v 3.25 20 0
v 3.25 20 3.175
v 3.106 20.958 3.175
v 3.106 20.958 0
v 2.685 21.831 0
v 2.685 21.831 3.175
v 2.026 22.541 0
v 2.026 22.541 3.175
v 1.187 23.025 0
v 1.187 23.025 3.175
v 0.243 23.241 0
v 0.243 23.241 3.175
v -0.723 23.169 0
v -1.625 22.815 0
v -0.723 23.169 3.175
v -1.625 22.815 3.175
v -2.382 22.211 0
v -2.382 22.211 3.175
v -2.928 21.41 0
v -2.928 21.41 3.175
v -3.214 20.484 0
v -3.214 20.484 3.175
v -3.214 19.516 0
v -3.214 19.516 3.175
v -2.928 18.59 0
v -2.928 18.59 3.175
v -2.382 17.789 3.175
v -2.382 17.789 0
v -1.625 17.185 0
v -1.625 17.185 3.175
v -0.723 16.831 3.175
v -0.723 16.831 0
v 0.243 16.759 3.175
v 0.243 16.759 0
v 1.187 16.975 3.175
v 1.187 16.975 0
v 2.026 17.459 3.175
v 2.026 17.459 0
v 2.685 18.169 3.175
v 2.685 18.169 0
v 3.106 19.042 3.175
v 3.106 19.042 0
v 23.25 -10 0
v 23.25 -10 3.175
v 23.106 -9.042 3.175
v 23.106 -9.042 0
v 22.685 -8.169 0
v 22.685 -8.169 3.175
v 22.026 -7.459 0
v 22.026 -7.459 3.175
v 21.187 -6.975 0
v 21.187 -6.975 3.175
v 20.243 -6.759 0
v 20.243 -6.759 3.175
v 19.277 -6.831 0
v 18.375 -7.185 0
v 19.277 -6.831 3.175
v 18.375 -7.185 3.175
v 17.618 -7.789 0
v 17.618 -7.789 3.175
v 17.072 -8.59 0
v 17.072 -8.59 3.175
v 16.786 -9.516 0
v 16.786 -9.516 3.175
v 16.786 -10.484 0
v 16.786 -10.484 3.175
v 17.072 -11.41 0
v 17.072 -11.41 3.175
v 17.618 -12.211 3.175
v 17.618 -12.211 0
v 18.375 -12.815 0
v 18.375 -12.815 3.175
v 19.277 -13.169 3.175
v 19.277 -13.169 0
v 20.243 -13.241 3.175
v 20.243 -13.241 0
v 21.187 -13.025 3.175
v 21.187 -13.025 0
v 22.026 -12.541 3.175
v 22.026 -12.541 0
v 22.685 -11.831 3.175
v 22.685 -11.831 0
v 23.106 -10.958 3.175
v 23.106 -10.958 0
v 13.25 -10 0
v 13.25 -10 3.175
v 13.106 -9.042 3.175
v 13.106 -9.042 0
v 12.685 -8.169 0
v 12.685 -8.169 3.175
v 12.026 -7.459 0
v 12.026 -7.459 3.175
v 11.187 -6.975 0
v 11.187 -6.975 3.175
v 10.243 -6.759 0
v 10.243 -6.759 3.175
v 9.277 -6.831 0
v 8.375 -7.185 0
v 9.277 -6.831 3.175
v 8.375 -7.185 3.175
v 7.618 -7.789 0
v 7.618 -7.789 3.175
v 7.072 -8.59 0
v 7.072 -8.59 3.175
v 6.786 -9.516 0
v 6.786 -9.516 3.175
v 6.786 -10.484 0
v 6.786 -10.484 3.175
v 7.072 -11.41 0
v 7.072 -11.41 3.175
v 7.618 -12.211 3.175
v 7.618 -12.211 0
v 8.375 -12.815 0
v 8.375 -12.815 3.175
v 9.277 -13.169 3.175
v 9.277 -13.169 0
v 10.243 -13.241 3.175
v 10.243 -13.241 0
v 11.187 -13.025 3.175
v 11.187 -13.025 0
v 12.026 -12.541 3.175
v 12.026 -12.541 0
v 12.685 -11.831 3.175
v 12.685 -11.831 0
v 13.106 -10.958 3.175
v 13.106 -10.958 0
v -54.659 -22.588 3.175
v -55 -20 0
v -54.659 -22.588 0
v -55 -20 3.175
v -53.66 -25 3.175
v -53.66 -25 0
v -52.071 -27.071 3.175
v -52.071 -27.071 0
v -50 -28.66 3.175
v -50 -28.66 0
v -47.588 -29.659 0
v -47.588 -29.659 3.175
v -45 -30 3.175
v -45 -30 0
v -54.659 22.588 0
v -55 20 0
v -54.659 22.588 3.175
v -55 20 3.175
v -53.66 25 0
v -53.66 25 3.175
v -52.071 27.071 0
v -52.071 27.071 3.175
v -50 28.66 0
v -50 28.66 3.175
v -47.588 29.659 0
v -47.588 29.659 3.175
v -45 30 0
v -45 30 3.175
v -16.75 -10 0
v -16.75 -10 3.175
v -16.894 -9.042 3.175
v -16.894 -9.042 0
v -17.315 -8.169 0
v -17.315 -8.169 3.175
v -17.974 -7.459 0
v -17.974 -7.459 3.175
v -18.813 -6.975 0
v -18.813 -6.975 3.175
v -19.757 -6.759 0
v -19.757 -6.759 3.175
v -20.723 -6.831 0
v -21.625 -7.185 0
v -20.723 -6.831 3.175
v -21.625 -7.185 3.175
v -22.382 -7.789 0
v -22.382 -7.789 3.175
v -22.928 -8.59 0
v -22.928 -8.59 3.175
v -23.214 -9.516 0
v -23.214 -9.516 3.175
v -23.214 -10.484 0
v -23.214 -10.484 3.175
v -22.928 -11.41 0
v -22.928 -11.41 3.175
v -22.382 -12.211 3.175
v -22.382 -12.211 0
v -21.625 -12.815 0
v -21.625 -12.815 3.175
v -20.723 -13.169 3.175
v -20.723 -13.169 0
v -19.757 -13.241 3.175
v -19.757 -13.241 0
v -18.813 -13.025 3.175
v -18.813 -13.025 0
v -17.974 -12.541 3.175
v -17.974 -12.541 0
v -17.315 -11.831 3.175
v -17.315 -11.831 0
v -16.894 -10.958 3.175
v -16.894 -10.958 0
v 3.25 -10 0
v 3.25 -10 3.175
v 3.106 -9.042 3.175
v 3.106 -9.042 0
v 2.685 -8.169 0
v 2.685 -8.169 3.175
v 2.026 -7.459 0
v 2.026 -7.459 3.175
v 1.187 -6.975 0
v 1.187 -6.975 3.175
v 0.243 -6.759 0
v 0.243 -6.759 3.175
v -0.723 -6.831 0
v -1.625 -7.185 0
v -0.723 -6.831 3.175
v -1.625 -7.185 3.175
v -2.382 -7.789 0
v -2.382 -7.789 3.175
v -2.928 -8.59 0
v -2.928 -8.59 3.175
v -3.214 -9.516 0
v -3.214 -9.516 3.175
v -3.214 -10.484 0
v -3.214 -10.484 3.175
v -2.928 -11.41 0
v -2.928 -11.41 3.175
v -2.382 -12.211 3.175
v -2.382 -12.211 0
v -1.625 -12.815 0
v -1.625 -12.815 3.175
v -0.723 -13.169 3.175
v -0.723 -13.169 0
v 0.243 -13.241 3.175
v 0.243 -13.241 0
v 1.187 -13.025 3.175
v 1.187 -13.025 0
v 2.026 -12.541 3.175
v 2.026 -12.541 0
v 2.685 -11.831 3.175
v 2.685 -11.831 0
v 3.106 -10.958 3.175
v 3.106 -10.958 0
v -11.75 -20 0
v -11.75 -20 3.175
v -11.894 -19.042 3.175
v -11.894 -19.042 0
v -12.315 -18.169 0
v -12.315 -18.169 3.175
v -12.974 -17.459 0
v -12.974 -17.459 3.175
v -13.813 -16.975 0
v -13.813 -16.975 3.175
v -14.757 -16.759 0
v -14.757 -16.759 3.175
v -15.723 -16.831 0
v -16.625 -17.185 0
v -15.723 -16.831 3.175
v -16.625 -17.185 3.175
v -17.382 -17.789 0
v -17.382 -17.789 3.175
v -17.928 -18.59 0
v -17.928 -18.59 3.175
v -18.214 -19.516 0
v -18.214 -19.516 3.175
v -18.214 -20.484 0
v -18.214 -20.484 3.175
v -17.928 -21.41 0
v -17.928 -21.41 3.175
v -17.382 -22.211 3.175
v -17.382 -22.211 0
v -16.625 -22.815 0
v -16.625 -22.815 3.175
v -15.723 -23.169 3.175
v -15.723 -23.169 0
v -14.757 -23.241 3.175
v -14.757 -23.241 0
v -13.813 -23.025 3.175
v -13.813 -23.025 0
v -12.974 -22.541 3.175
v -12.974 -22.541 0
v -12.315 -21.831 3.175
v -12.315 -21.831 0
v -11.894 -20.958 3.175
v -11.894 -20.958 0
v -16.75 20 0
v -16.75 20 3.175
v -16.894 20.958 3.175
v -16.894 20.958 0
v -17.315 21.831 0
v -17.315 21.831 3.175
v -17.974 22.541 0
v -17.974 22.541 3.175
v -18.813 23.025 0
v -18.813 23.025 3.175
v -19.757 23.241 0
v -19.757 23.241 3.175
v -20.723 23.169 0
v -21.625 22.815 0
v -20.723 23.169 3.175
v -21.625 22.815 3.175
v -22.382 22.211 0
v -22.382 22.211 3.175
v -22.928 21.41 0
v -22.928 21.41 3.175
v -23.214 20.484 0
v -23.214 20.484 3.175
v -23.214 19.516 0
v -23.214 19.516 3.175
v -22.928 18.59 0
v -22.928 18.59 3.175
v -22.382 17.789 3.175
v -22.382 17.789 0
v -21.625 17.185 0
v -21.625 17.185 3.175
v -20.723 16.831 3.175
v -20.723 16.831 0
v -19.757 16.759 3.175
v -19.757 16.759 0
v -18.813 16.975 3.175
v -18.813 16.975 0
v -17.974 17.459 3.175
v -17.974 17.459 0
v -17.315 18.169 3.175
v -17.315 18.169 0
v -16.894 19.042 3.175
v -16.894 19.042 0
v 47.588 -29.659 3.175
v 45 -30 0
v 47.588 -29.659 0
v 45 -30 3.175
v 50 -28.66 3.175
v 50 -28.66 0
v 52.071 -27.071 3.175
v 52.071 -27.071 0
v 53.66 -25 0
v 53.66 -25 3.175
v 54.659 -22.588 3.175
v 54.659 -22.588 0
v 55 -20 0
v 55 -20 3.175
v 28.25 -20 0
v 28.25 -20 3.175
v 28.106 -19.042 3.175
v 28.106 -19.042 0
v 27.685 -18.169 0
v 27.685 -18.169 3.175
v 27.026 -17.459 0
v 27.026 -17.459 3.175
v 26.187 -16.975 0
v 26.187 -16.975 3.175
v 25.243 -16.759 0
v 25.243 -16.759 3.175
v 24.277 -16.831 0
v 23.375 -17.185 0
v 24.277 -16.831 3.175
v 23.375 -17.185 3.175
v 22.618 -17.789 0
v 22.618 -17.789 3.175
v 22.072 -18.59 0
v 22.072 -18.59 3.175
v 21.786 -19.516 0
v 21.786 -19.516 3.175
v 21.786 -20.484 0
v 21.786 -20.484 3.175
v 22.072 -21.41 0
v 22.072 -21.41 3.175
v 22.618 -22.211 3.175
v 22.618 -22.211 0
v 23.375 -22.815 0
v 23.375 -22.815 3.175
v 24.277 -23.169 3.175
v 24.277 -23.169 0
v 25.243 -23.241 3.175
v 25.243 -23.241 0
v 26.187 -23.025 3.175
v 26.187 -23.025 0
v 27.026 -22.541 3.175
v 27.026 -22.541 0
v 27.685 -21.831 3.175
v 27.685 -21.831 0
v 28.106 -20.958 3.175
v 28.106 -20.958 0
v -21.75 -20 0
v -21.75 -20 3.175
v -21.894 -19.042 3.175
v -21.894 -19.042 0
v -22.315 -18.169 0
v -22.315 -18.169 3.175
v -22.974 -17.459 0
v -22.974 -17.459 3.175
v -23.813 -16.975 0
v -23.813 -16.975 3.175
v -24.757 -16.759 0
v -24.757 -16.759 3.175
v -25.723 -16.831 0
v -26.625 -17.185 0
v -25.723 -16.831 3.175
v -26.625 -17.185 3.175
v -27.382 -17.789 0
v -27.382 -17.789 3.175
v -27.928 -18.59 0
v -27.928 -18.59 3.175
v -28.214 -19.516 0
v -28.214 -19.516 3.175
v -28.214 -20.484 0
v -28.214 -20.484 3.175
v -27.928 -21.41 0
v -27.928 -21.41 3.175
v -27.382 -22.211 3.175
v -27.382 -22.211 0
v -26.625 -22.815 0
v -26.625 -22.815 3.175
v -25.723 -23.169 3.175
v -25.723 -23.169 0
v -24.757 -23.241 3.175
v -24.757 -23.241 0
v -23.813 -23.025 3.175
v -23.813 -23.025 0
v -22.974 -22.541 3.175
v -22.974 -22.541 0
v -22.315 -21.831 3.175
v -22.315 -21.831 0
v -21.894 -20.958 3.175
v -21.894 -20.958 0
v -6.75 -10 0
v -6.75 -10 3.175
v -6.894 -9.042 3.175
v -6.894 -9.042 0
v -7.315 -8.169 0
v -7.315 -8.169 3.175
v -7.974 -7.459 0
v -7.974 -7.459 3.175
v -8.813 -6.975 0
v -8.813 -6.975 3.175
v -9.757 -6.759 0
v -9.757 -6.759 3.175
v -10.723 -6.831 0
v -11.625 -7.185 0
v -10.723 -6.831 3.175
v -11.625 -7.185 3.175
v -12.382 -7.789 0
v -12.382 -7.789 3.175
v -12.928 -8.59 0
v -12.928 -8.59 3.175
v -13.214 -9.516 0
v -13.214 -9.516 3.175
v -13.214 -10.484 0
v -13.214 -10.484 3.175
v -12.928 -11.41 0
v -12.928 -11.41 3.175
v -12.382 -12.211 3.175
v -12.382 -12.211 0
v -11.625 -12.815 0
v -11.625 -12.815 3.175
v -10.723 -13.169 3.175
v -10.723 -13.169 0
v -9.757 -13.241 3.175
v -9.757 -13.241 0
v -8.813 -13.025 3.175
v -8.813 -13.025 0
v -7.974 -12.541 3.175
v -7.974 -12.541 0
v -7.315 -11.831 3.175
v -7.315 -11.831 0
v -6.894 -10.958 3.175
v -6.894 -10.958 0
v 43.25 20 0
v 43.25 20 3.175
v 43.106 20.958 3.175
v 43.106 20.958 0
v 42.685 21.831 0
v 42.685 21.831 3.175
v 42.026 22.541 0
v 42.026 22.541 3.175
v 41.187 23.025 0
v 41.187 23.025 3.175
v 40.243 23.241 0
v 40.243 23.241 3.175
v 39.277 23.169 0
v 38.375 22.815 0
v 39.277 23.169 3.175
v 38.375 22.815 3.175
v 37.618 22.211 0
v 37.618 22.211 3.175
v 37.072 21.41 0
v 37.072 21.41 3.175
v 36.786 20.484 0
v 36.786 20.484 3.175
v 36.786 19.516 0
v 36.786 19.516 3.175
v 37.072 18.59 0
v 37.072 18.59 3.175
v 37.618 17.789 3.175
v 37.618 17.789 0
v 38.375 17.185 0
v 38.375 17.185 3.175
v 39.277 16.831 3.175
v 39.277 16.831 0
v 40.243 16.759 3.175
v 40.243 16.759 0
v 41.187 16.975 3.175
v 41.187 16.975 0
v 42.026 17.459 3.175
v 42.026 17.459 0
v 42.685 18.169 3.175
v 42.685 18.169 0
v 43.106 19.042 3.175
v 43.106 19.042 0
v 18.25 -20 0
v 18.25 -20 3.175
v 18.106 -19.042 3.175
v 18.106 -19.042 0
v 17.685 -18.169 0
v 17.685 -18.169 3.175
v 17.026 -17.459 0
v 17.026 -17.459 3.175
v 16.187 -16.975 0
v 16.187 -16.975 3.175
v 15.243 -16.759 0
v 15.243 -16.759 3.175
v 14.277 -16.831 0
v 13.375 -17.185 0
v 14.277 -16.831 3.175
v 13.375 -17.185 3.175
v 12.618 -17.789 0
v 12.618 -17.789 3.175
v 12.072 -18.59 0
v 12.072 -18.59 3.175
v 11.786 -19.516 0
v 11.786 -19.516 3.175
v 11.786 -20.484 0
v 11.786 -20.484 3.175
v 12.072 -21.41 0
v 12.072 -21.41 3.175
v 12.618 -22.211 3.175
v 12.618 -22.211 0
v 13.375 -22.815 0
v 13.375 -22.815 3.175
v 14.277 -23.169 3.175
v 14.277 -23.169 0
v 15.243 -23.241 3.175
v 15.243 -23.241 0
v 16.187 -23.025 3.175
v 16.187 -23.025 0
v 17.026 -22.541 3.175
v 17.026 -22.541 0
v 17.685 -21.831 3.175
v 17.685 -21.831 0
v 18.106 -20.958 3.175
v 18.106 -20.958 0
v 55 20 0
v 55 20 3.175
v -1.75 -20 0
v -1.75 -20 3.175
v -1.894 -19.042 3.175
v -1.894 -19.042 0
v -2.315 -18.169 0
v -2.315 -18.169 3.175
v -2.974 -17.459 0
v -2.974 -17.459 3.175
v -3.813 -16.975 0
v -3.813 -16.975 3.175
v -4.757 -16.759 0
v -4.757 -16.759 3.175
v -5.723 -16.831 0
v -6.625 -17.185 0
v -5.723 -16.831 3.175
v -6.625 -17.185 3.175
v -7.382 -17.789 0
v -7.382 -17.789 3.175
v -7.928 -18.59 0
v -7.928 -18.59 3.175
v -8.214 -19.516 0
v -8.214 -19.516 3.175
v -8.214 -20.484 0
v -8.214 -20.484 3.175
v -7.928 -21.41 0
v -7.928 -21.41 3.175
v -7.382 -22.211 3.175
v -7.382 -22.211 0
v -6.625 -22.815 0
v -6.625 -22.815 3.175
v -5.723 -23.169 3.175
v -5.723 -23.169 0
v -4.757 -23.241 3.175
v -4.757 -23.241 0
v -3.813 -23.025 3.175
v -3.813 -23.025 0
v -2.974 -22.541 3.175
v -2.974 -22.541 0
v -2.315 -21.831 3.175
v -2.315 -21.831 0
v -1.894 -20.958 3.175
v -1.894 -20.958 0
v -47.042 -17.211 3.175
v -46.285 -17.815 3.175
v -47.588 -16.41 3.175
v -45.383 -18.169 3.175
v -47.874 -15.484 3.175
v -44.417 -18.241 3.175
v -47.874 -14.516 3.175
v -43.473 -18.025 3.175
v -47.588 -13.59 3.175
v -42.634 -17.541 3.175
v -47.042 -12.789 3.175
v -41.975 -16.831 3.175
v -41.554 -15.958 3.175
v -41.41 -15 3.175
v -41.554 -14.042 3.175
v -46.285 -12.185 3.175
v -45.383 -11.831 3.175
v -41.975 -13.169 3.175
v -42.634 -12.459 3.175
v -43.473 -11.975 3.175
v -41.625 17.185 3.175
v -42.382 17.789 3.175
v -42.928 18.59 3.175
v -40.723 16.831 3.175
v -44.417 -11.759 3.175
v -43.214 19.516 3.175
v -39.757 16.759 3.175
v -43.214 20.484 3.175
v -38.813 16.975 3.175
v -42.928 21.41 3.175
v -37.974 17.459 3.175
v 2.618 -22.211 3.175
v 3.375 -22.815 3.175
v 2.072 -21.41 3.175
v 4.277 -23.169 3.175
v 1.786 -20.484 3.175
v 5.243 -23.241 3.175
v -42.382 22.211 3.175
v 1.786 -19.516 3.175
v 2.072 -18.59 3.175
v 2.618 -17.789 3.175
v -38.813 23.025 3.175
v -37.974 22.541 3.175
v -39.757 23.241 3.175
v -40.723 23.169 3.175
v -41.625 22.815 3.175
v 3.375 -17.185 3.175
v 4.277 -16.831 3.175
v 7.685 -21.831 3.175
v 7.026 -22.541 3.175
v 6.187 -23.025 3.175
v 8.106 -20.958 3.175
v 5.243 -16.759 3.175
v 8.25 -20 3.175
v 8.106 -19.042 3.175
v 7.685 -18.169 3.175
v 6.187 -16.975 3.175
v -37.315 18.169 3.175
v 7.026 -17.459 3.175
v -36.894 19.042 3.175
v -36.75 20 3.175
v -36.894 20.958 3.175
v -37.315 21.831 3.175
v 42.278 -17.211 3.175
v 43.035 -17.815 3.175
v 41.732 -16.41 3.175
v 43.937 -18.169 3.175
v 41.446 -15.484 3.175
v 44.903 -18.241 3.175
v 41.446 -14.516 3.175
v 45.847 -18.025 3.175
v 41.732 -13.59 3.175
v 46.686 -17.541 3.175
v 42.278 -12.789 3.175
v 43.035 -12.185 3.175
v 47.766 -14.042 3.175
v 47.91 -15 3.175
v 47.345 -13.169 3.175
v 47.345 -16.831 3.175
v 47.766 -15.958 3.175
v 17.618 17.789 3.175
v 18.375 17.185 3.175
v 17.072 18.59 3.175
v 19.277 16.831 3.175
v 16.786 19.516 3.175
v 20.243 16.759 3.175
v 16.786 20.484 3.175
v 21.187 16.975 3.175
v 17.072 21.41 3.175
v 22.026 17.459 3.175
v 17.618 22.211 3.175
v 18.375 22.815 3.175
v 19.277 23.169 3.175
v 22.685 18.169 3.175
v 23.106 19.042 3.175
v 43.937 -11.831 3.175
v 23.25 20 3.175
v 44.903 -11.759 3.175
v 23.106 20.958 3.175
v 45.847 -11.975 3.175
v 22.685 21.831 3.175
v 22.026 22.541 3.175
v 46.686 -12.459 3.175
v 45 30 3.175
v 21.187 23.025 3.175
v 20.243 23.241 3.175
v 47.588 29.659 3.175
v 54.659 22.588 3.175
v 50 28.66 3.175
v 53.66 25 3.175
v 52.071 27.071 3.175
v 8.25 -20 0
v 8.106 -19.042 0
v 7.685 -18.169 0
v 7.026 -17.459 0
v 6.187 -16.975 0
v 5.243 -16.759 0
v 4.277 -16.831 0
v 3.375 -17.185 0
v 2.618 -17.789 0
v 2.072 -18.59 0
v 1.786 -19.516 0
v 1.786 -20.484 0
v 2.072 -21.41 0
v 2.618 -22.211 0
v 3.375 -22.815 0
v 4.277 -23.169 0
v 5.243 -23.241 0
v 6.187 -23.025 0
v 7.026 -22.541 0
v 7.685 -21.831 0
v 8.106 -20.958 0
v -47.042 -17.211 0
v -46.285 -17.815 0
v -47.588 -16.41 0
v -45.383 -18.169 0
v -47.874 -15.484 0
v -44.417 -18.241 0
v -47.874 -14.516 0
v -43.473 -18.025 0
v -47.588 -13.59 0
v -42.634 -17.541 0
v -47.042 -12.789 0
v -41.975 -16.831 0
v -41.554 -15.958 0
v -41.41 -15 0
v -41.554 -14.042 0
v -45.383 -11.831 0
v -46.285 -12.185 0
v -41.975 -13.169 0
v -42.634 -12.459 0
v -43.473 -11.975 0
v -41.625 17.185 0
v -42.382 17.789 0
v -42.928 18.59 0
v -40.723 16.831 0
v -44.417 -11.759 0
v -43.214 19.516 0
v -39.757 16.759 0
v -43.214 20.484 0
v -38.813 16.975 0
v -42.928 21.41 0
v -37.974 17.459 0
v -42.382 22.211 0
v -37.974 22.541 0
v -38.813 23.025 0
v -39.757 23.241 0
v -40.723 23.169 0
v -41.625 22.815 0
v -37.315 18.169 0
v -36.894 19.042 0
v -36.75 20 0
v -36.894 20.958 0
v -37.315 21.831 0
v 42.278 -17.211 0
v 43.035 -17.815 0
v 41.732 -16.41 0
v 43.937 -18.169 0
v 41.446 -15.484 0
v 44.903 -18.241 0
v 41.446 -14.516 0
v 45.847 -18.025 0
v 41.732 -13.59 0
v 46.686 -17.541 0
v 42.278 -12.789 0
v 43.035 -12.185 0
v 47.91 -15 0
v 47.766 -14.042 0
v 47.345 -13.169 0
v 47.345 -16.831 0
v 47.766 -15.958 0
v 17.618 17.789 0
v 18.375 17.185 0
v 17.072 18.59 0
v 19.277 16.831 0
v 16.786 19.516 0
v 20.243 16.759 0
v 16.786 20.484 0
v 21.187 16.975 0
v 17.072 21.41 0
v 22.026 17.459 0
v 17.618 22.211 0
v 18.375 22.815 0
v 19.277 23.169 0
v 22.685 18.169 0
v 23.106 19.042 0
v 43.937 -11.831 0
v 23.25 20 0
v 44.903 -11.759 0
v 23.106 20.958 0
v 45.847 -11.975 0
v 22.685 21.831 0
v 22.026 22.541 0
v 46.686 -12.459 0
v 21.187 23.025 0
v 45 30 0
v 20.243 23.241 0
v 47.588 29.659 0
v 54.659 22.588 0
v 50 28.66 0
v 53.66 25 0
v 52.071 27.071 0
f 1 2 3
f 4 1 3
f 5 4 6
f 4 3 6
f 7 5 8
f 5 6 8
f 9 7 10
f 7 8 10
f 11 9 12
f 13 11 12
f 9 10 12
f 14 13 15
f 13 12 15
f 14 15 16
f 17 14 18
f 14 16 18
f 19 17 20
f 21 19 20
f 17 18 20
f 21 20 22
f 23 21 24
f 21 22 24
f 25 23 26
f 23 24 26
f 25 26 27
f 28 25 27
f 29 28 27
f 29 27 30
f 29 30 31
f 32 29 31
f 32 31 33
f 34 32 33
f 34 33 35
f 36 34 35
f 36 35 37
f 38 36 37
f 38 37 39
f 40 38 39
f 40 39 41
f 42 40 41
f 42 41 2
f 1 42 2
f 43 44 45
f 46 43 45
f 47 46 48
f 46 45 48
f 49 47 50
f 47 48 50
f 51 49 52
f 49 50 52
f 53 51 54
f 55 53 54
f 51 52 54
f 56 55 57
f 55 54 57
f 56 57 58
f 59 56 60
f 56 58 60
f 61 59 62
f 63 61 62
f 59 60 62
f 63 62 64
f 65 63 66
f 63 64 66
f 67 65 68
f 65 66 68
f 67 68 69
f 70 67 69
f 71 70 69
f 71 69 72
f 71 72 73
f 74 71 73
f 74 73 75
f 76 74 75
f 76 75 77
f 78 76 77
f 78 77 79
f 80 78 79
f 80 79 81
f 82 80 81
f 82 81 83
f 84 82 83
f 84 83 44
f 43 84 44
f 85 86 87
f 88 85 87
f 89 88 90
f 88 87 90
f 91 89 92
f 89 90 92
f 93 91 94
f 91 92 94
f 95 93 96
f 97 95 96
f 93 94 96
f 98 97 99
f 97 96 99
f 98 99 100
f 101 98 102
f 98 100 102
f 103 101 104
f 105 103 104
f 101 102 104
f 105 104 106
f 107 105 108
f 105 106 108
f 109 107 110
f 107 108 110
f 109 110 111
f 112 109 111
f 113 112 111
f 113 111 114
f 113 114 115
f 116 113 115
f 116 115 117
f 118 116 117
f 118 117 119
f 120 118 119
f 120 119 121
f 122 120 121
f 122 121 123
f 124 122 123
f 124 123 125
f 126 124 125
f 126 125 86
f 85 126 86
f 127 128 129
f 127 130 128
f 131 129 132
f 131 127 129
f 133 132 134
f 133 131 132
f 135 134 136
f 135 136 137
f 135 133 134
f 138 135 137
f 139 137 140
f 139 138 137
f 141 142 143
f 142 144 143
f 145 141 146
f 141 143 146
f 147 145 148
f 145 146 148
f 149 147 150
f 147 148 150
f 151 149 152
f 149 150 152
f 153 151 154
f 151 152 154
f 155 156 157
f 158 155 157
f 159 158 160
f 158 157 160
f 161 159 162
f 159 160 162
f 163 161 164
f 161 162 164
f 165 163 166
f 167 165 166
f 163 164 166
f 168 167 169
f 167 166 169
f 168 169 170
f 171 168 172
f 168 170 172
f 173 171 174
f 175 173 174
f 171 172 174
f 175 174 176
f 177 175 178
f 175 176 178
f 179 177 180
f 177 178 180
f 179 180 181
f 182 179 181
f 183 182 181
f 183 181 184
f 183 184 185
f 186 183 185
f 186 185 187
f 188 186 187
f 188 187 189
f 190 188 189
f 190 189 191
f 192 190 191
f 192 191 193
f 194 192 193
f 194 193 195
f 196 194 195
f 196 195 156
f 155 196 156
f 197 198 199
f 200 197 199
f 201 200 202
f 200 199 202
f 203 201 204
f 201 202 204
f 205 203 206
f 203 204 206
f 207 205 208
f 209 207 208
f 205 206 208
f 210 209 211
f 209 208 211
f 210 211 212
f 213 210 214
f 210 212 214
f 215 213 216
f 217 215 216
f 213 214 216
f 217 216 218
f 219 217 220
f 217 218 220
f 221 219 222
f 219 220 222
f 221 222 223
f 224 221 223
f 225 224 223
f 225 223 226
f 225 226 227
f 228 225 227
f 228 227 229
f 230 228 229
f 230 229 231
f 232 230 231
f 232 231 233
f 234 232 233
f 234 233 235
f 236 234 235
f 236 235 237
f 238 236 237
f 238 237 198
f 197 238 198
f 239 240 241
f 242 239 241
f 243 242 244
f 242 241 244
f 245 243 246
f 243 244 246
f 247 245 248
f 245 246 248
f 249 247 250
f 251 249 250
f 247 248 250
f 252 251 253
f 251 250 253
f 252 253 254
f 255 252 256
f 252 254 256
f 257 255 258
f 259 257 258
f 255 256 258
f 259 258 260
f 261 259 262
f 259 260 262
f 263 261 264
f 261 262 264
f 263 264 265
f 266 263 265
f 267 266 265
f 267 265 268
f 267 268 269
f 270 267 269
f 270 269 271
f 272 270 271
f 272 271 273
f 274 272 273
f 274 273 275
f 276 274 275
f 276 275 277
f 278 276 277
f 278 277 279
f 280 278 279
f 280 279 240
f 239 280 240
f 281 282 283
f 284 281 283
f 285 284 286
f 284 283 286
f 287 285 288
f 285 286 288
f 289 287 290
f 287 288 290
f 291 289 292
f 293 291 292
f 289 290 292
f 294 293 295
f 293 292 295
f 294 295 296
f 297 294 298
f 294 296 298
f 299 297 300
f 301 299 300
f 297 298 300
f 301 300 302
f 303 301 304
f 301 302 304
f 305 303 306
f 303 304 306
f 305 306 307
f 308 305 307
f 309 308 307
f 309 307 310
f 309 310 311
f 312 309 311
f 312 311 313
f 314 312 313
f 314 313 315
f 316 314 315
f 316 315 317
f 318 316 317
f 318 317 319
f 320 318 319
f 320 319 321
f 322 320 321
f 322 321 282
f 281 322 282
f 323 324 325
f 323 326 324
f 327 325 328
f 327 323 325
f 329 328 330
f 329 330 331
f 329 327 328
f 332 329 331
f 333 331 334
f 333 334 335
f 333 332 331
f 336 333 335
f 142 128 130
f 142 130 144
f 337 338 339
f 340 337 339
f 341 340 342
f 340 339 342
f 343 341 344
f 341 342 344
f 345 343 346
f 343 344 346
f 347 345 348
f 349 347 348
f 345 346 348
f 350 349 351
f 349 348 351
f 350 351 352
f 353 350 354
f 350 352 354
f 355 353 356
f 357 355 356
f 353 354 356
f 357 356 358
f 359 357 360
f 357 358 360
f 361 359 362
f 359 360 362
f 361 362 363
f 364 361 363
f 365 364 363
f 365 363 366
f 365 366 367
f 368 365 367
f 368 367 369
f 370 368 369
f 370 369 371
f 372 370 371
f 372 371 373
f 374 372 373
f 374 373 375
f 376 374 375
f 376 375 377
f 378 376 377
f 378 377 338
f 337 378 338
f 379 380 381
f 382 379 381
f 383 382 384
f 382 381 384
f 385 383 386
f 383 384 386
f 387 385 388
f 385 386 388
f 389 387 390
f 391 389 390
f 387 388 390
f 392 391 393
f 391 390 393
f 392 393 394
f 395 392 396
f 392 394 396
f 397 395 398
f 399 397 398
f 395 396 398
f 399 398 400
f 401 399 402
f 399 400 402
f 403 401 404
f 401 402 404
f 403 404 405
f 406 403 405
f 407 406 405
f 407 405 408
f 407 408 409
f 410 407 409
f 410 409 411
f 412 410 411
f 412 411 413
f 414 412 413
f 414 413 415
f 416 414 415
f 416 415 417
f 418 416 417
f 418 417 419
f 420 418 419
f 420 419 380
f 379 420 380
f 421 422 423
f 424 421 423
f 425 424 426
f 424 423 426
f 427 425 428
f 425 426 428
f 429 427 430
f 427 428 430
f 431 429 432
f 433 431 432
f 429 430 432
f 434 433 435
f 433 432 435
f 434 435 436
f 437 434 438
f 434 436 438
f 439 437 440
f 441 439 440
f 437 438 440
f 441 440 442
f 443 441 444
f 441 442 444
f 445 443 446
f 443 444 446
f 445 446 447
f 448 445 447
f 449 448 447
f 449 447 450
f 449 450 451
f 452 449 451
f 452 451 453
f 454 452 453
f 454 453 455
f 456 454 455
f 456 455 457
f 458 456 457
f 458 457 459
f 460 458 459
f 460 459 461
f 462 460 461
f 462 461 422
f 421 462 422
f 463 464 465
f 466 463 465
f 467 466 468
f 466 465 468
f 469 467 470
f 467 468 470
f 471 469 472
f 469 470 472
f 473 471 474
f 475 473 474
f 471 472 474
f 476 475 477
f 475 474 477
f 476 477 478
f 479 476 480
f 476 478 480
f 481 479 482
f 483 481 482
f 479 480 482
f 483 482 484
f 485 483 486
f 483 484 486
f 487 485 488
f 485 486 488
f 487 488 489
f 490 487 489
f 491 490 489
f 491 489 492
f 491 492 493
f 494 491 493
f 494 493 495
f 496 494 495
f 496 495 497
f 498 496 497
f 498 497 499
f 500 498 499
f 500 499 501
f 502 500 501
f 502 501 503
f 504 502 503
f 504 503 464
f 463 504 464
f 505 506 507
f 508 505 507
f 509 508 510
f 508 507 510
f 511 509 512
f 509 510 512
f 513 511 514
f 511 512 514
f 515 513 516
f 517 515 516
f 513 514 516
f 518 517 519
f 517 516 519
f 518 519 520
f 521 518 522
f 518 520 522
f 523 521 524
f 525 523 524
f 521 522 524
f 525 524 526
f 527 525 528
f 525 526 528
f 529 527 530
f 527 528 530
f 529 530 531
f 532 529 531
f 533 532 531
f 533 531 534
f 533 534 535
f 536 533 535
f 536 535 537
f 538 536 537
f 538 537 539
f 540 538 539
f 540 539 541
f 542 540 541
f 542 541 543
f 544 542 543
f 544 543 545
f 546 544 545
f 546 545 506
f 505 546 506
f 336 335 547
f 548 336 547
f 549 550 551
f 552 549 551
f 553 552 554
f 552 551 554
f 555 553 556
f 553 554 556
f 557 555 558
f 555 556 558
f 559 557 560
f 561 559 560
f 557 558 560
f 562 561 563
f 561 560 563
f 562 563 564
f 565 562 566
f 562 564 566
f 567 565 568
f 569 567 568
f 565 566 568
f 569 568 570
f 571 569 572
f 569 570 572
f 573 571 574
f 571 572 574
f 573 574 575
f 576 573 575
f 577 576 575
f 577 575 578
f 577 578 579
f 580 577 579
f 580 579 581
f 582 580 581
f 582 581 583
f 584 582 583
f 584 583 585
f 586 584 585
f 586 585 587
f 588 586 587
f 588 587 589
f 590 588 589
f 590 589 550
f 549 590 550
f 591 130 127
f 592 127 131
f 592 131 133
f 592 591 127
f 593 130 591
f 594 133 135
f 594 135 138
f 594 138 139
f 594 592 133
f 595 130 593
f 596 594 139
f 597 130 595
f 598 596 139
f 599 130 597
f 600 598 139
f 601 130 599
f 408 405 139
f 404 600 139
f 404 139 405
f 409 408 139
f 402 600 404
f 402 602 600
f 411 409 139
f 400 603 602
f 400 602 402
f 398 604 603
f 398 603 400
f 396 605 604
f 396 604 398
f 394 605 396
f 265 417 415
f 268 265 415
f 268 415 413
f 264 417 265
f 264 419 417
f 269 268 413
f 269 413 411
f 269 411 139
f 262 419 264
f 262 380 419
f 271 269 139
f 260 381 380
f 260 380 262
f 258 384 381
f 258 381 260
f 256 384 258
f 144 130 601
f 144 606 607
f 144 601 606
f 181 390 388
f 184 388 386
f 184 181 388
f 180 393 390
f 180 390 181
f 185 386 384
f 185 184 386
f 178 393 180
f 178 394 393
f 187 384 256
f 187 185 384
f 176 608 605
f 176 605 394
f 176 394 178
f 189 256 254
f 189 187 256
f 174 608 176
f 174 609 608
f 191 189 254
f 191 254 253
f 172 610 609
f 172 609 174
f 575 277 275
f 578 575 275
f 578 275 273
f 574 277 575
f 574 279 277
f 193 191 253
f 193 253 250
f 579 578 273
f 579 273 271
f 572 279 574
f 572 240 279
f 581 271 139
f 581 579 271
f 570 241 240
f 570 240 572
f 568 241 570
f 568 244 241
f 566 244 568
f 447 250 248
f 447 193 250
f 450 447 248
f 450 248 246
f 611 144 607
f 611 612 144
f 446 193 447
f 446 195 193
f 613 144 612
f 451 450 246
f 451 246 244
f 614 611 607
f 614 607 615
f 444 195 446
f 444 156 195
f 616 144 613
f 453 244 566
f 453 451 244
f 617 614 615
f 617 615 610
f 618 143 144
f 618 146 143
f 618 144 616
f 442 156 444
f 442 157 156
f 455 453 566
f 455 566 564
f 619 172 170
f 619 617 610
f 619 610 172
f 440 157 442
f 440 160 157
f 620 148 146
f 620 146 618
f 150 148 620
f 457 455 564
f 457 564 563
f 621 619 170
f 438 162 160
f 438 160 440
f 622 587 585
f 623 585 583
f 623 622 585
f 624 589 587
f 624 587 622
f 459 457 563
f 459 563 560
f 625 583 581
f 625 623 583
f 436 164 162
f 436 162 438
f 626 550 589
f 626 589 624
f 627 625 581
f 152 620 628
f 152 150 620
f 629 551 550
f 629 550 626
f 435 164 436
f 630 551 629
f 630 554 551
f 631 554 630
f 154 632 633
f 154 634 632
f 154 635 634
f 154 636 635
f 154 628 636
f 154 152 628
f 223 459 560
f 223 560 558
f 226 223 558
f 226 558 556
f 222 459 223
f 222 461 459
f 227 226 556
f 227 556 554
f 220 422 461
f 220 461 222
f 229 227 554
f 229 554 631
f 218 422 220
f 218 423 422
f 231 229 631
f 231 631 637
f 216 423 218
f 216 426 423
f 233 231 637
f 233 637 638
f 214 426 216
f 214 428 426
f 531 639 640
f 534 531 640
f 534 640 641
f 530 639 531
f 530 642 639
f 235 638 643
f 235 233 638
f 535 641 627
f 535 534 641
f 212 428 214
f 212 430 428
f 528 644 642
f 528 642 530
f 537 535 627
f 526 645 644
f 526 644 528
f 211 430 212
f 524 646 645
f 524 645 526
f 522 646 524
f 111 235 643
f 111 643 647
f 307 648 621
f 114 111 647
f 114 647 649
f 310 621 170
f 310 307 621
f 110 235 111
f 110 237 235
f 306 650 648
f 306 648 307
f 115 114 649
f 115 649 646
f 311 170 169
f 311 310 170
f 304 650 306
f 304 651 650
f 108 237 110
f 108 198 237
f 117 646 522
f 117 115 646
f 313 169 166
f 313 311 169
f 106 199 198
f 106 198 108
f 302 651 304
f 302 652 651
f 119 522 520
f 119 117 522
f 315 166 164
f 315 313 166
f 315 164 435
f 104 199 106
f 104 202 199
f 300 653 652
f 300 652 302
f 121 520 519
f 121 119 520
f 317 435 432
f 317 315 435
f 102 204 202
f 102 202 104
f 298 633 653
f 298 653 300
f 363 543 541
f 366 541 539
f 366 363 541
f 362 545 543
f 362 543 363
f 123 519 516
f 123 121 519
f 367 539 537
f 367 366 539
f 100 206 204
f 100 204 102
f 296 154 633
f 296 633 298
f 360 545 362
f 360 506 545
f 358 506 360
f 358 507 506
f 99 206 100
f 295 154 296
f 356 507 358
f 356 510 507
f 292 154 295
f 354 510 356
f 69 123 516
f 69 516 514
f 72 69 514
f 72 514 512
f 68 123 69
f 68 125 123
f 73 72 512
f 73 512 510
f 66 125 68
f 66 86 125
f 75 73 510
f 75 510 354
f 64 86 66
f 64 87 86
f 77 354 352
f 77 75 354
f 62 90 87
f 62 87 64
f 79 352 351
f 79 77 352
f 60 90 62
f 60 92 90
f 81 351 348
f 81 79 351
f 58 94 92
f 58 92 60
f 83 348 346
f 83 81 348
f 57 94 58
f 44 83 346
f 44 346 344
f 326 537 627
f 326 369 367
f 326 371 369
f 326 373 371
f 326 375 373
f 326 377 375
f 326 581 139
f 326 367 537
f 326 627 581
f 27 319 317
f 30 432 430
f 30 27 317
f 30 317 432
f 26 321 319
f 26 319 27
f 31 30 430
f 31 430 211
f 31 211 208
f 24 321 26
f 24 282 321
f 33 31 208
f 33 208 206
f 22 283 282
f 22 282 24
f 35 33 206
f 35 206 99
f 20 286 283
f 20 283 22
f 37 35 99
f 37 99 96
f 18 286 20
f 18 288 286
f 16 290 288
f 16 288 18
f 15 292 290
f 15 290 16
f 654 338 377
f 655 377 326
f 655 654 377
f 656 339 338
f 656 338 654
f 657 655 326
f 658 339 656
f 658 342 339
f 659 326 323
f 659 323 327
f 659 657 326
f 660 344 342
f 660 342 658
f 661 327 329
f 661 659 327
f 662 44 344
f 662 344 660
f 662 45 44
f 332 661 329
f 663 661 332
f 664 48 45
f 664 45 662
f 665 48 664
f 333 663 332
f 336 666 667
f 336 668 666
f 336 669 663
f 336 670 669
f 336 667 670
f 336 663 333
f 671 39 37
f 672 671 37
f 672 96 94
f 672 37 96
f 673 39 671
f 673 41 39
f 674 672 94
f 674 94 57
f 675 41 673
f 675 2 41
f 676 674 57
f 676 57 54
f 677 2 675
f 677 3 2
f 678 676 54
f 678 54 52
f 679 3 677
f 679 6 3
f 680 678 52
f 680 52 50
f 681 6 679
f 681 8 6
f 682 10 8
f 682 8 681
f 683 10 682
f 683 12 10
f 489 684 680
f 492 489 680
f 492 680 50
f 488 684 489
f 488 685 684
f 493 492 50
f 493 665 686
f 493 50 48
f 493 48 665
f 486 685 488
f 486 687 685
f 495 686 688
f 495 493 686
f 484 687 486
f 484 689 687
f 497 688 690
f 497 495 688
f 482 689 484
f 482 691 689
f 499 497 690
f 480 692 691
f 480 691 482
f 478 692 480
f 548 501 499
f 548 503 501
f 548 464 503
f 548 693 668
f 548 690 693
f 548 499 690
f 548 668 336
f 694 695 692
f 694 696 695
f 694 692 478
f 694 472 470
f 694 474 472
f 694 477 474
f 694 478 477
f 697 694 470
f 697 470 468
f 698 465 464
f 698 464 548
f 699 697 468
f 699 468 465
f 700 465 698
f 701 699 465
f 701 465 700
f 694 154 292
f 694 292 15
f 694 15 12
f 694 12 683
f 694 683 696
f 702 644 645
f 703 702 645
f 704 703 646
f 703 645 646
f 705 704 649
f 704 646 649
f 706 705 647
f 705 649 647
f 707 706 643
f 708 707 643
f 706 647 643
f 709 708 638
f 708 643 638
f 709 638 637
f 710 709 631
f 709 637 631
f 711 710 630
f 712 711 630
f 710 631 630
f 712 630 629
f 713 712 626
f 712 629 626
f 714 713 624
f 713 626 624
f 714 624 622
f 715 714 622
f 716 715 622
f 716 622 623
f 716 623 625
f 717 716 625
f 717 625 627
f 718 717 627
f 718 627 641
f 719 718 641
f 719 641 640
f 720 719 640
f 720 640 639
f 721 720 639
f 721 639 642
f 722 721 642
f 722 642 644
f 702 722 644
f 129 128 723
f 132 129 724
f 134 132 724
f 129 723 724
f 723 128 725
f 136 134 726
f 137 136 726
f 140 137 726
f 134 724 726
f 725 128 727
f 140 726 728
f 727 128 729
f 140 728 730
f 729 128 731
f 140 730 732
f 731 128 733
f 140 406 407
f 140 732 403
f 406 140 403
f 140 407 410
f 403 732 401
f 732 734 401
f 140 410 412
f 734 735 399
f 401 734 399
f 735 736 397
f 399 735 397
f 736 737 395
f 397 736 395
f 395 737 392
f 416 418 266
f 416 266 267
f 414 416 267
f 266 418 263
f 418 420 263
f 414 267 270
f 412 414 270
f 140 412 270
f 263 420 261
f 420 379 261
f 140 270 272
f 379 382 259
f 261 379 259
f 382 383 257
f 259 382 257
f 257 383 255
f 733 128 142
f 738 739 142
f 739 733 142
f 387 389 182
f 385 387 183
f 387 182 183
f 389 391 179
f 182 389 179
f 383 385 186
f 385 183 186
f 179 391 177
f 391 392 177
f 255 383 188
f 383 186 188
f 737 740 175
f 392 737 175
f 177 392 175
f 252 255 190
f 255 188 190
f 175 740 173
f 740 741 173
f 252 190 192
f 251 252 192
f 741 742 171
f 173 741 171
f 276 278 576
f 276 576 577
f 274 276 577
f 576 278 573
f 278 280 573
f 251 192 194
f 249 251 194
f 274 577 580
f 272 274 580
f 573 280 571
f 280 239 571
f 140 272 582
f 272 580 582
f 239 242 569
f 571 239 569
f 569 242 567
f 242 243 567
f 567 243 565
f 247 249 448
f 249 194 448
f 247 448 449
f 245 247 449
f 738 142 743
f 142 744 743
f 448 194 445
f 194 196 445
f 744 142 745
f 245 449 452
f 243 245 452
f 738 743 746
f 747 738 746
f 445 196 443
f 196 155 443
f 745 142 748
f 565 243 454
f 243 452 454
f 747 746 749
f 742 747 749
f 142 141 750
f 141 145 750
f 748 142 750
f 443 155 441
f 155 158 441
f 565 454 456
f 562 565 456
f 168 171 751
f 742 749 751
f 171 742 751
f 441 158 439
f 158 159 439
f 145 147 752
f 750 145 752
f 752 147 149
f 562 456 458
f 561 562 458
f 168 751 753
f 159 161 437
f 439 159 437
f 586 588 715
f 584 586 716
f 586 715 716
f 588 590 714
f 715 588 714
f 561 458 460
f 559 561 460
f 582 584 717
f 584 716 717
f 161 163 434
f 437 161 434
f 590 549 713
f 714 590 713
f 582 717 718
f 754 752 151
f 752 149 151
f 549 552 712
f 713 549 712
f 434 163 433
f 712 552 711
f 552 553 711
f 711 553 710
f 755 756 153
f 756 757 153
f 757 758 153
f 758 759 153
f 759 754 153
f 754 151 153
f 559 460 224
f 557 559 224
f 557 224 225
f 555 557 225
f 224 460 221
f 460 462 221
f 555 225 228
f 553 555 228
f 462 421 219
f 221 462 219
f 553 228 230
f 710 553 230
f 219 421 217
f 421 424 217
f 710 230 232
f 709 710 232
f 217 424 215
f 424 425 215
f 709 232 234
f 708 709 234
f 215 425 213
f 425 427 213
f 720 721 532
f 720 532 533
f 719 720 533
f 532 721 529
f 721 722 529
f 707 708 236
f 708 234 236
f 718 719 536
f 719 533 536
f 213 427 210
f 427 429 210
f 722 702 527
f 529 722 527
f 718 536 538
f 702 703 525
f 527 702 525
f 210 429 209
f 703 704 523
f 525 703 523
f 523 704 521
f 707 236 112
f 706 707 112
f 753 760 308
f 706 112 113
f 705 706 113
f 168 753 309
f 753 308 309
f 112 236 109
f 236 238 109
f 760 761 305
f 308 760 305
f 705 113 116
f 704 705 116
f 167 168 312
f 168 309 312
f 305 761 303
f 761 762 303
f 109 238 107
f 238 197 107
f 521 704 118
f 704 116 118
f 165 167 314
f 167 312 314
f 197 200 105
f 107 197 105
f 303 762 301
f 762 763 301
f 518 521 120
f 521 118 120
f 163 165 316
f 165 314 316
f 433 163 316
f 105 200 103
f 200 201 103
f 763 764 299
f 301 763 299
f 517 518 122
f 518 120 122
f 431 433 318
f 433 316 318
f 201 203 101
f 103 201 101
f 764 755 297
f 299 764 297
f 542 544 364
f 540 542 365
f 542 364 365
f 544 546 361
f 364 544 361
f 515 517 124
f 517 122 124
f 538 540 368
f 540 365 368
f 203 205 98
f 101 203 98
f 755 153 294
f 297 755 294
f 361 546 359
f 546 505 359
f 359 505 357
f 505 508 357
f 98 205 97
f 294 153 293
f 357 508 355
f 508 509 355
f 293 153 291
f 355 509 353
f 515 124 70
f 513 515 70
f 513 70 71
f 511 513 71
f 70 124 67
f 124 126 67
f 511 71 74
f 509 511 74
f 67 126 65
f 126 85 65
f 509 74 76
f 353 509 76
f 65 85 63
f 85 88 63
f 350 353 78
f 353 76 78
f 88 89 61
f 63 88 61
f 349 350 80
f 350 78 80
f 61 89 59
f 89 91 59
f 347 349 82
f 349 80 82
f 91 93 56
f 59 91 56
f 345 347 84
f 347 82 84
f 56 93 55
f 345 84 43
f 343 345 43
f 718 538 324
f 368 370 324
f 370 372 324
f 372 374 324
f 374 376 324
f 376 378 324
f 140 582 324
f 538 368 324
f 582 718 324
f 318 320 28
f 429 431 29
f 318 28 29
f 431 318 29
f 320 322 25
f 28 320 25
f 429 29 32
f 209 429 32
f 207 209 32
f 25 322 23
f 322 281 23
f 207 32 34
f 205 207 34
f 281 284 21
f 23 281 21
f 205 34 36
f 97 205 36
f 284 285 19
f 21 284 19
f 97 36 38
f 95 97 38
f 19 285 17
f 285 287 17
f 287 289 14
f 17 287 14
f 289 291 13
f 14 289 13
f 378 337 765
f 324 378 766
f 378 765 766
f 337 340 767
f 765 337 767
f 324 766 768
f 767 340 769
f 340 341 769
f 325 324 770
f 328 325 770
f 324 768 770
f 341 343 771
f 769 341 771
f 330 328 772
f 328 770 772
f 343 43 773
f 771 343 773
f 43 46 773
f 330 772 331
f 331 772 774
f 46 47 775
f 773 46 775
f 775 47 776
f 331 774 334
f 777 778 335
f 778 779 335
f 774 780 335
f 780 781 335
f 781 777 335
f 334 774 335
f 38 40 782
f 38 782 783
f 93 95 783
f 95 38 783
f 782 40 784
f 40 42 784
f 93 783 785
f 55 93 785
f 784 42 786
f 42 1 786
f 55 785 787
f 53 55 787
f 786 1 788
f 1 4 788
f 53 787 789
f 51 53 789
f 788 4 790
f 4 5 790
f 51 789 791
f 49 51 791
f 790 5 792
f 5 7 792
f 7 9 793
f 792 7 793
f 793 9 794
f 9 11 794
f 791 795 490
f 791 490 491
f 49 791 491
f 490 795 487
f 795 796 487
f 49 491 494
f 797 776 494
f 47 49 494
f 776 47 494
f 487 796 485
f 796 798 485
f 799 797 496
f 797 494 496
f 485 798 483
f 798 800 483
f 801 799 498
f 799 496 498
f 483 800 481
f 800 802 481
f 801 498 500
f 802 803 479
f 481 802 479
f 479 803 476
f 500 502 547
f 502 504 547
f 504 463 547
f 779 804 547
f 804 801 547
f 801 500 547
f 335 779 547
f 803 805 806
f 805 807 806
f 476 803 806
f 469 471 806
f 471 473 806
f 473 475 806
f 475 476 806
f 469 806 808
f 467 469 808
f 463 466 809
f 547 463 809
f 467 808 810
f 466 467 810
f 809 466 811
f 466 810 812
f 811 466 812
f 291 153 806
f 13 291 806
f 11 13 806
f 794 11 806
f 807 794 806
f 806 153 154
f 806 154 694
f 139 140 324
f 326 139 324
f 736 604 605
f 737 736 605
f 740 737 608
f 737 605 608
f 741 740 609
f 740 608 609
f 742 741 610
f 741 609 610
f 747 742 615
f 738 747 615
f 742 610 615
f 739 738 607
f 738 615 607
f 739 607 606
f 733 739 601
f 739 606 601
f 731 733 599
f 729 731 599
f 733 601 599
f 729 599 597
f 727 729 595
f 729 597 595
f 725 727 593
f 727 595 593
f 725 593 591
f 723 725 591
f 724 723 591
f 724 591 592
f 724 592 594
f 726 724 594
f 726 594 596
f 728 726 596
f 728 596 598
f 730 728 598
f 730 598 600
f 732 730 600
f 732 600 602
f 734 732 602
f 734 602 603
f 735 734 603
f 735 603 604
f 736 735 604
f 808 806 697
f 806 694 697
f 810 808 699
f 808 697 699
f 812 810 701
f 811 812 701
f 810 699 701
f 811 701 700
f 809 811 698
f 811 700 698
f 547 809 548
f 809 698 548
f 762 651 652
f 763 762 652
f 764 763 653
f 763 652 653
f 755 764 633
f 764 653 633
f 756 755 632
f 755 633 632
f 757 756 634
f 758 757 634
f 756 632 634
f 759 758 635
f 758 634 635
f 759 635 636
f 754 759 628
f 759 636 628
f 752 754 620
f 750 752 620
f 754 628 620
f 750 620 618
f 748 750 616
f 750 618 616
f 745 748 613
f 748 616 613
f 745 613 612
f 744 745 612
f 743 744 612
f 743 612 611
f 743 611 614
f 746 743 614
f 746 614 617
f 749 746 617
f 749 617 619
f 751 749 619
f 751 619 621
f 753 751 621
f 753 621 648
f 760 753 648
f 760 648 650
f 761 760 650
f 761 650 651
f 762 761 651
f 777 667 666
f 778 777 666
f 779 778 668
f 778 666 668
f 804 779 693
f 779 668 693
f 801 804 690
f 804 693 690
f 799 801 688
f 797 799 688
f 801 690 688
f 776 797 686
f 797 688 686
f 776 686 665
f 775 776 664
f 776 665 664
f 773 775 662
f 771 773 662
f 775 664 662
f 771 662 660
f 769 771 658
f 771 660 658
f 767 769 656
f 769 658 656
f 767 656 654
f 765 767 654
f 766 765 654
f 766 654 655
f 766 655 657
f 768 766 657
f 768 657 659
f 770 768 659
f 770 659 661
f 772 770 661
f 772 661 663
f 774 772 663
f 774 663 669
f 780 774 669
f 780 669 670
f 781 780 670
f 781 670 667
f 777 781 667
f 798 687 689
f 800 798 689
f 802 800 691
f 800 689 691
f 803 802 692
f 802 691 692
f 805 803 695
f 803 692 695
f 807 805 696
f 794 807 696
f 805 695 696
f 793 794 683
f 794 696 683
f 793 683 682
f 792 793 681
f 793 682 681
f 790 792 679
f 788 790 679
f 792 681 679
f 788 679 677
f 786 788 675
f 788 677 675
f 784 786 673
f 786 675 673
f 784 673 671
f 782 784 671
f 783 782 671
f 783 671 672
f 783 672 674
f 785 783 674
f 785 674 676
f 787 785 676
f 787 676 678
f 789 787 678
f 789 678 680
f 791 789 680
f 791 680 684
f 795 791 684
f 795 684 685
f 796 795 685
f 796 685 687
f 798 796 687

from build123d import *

# Parameters (mm, degrees)
SKETCH1_W           = 110
SKETCH1_H           = 60
BOSS_EXTRUDE1_DEPTH = 3.175
SKETCH2_R           = 3.25
CUT_EXTRUDE1_DEPTH  = 4.175
FILLET1_R           = 10


with BuildPart() as part:
    # Sketch1 → Boss-Extrude1 (new body)
    with BuildSketch(Plane.XY):
        Rectangle(SKETCH1_W, SKETCH1_H)
    extrude(amount=BOSS_EXTRUDE1_DEPTH)

    # Sketch2 → Cut-Extrude1 (cut, through all)
    with BuildSketch(Plane.XY.offset(3.175)):
        with Locations((-40, 20)):
            Circle(SKETCH2_R)
        with Locations((40, 20)):
            Circle(SKETCH2_R)
        with Locations((-20, 20)):
            Circle(SKETCH2_R)
        with Locations((0, 20)):
            Circle(SKETCH2_R)
        with Locations((20, 20)):
            Circle(SKETCH2_R)
        with Locations((44.66, -15)):
            Circle(SKETCH2_R)
        with Locations((5, -20)):
            Circle(SKETCH2_R)
        with Locations((0, -10)):
            Circle(SKETCH2_R)
        with Locations((-5, -20)):
            Circle(SKETCH2_R)
        with Locations((-10, -10)):
            Circle(SKETCH2_R)
        with Locations((-15, -20)):
            Circle(SKETCH2_R)
        with Locations((10, -10)):
            Circle(SKETCH2_R)
        with Locations((-20, -10)):
            Circle(SKETCH2_R)
        with Locations((-44.66, -15)):
            Circle(SKETCH2_R)
        with Locations((20, -10)):
            Circle(SKETCH2_R)
        with Locations((15, -20)):
            Circle(SKETCH2_R)
        with Locations((-25, -20)):
            Circle(SKETCH2_R)
        with Locations((25, -20)):
            Circle(SKETCH2_R)
    extrude(amount=-CUT_EXTRUDE1_DEPTH, mode=Mode.SUBTRACT)

    # Fillet1
    fillet1_edges = [part.edges().sort_by_distance(p)[0] for p in [
        (55, -30, 1.5875),
        (-55, -30, 1.5875),
        (-55, 30, 1.5875),
        (55, 30, 1.5875),
    ]]
    fillet(fillet1_edges, radius=FILLET1_R)


solid = part.part
